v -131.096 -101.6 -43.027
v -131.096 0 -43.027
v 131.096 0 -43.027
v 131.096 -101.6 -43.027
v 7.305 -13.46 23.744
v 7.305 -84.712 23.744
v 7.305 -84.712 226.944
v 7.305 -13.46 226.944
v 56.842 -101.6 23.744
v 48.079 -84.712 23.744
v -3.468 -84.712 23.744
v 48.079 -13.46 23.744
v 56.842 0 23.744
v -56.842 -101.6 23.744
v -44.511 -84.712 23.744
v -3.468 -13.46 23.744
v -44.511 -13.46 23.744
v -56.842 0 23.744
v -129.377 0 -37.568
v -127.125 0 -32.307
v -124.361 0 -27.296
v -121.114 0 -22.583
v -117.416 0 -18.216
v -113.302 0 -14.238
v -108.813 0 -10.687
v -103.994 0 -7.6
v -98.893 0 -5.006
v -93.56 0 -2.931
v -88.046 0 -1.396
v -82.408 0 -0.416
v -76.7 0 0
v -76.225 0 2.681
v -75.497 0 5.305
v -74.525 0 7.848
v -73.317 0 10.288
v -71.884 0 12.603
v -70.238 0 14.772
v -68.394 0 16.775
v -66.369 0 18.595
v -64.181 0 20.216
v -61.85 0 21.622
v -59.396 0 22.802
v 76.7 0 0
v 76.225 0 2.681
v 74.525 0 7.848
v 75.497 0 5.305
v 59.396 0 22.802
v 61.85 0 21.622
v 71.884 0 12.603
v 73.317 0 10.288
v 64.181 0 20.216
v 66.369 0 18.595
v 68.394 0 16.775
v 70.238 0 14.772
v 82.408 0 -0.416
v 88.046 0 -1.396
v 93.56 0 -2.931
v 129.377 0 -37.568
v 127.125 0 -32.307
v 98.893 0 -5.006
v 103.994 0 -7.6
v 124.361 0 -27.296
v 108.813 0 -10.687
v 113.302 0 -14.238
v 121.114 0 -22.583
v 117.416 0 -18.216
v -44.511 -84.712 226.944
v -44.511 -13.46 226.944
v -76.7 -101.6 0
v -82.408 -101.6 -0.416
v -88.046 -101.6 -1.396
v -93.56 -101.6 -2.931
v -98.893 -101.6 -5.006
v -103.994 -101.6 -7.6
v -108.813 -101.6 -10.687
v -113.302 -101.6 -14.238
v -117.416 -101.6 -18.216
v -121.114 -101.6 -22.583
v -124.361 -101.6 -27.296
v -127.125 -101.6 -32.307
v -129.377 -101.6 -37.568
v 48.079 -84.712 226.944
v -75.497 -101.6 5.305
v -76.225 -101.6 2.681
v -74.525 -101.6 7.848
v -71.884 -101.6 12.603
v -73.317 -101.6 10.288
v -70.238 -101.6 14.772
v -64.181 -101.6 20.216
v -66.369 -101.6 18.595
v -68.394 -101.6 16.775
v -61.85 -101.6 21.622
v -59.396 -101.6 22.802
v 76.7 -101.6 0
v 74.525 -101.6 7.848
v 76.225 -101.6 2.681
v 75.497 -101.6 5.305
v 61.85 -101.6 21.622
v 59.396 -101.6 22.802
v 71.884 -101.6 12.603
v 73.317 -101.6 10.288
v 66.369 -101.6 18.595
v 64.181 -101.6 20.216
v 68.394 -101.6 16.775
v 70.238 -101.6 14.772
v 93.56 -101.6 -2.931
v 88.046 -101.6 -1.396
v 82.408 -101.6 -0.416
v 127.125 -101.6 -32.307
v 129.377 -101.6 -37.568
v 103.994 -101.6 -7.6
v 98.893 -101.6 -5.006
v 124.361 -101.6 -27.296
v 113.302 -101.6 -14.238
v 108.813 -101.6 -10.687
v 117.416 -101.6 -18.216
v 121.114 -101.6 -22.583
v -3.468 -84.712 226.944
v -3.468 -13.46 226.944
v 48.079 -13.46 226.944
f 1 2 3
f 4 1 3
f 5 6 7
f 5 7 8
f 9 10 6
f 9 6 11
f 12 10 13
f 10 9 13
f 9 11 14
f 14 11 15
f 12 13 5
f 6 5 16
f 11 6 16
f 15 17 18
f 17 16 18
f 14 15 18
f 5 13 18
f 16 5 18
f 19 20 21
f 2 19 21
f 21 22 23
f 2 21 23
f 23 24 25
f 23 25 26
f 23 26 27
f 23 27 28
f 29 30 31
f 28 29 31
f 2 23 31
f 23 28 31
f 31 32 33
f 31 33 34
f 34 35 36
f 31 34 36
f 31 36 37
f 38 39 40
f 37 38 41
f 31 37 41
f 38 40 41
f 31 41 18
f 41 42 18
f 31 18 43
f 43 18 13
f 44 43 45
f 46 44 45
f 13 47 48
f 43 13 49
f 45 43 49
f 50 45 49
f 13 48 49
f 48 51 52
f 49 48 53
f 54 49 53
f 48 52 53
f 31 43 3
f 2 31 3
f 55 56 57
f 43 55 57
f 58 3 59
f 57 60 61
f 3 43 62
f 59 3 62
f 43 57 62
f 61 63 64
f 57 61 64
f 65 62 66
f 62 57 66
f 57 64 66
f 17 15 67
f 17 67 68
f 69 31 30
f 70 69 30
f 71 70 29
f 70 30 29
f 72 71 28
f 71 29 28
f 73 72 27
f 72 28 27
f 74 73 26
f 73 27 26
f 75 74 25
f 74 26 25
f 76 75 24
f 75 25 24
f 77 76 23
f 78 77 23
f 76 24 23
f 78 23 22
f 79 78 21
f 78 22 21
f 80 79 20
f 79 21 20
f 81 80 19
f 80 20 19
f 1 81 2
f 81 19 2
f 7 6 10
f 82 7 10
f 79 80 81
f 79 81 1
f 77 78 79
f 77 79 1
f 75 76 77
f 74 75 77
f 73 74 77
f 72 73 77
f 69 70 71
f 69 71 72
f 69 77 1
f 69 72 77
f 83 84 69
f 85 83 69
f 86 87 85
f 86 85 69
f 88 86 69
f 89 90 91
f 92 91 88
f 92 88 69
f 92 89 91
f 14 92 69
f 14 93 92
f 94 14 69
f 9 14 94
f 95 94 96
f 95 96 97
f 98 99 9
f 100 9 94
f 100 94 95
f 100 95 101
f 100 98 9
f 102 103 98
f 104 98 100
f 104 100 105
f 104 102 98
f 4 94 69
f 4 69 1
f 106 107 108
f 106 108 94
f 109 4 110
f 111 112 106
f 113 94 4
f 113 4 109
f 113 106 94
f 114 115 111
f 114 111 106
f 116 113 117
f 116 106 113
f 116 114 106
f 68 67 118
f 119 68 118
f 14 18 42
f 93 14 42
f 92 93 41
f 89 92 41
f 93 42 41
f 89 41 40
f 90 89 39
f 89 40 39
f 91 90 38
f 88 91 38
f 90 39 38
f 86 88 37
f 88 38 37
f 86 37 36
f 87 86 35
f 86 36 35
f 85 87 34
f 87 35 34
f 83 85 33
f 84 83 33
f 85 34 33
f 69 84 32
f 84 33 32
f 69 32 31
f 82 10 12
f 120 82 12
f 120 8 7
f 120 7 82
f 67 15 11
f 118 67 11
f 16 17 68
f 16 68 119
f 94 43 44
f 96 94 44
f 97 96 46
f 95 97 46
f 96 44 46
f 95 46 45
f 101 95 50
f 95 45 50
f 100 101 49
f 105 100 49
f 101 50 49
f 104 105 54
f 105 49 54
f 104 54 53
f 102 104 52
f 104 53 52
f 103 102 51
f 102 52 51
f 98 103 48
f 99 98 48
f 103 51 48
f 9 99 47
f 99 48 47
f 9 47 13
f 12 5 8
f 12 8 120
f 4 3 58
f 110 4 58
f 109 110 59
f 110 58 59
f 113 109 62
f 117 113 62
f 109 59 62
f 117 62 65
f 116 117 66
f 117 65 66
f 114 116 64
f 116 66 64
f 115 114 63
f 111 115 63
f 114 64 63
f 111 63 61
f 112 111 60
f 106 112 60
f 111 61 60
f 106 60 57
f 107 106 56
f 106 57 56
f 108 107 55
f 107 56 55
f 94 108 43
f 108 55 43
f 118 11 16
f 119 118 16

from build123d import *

# Parameters (mm, degrees)
F1_DEPTH = 101.6
F2_W     = 41.042692
F2_H     = 71.251595
F2_W_2   = 40.773873
F3_DEPTH = 203.2


with BuildPart() as f1:
    # F0 (on Front) → F1 (new body)
    with BuildSketch(Plane.XZ):
        with BuildLine():
            Line((-131.095514, -43.026961), (-122.749157, -43.026961))
            Line((-122.749157, -43.026961), (131.095514, -43.026961))
            ThreePointArc((131.095514, -43.026961), (111.101538, -12.406508), (76.700233, 0))
            ThreePointArc((76.700233, 0), (70.237943, 14.771668), (56.841634, 23.743974))
            Line((56.841634, 23.743974), (-56.841634, 23.743974))
            ThreePointArc((-56.841634, 23.743974), (-70.237943, 14.771668), (-76.700233, 0))
            ThreePointArc((-76.700233, 0), (-111.101538, -12.406508), (-131.095514, -43.026961))
        make_face()
    extrude(amount=F1_DEPTH)

    # F2 (on face) → F3 (join)
    with BuildSketch(Plane.XY.offset(23.743974)):
        with Locations((-23.989629, -49.085791)):
            Rectangle(F2_W, F2_H)
        with Locations((27.691657, -49.085791)):
            Rectangle(F2_W_2, F2_H)
    extrude(amount=F3_DEPTH)


solid = f1.part
